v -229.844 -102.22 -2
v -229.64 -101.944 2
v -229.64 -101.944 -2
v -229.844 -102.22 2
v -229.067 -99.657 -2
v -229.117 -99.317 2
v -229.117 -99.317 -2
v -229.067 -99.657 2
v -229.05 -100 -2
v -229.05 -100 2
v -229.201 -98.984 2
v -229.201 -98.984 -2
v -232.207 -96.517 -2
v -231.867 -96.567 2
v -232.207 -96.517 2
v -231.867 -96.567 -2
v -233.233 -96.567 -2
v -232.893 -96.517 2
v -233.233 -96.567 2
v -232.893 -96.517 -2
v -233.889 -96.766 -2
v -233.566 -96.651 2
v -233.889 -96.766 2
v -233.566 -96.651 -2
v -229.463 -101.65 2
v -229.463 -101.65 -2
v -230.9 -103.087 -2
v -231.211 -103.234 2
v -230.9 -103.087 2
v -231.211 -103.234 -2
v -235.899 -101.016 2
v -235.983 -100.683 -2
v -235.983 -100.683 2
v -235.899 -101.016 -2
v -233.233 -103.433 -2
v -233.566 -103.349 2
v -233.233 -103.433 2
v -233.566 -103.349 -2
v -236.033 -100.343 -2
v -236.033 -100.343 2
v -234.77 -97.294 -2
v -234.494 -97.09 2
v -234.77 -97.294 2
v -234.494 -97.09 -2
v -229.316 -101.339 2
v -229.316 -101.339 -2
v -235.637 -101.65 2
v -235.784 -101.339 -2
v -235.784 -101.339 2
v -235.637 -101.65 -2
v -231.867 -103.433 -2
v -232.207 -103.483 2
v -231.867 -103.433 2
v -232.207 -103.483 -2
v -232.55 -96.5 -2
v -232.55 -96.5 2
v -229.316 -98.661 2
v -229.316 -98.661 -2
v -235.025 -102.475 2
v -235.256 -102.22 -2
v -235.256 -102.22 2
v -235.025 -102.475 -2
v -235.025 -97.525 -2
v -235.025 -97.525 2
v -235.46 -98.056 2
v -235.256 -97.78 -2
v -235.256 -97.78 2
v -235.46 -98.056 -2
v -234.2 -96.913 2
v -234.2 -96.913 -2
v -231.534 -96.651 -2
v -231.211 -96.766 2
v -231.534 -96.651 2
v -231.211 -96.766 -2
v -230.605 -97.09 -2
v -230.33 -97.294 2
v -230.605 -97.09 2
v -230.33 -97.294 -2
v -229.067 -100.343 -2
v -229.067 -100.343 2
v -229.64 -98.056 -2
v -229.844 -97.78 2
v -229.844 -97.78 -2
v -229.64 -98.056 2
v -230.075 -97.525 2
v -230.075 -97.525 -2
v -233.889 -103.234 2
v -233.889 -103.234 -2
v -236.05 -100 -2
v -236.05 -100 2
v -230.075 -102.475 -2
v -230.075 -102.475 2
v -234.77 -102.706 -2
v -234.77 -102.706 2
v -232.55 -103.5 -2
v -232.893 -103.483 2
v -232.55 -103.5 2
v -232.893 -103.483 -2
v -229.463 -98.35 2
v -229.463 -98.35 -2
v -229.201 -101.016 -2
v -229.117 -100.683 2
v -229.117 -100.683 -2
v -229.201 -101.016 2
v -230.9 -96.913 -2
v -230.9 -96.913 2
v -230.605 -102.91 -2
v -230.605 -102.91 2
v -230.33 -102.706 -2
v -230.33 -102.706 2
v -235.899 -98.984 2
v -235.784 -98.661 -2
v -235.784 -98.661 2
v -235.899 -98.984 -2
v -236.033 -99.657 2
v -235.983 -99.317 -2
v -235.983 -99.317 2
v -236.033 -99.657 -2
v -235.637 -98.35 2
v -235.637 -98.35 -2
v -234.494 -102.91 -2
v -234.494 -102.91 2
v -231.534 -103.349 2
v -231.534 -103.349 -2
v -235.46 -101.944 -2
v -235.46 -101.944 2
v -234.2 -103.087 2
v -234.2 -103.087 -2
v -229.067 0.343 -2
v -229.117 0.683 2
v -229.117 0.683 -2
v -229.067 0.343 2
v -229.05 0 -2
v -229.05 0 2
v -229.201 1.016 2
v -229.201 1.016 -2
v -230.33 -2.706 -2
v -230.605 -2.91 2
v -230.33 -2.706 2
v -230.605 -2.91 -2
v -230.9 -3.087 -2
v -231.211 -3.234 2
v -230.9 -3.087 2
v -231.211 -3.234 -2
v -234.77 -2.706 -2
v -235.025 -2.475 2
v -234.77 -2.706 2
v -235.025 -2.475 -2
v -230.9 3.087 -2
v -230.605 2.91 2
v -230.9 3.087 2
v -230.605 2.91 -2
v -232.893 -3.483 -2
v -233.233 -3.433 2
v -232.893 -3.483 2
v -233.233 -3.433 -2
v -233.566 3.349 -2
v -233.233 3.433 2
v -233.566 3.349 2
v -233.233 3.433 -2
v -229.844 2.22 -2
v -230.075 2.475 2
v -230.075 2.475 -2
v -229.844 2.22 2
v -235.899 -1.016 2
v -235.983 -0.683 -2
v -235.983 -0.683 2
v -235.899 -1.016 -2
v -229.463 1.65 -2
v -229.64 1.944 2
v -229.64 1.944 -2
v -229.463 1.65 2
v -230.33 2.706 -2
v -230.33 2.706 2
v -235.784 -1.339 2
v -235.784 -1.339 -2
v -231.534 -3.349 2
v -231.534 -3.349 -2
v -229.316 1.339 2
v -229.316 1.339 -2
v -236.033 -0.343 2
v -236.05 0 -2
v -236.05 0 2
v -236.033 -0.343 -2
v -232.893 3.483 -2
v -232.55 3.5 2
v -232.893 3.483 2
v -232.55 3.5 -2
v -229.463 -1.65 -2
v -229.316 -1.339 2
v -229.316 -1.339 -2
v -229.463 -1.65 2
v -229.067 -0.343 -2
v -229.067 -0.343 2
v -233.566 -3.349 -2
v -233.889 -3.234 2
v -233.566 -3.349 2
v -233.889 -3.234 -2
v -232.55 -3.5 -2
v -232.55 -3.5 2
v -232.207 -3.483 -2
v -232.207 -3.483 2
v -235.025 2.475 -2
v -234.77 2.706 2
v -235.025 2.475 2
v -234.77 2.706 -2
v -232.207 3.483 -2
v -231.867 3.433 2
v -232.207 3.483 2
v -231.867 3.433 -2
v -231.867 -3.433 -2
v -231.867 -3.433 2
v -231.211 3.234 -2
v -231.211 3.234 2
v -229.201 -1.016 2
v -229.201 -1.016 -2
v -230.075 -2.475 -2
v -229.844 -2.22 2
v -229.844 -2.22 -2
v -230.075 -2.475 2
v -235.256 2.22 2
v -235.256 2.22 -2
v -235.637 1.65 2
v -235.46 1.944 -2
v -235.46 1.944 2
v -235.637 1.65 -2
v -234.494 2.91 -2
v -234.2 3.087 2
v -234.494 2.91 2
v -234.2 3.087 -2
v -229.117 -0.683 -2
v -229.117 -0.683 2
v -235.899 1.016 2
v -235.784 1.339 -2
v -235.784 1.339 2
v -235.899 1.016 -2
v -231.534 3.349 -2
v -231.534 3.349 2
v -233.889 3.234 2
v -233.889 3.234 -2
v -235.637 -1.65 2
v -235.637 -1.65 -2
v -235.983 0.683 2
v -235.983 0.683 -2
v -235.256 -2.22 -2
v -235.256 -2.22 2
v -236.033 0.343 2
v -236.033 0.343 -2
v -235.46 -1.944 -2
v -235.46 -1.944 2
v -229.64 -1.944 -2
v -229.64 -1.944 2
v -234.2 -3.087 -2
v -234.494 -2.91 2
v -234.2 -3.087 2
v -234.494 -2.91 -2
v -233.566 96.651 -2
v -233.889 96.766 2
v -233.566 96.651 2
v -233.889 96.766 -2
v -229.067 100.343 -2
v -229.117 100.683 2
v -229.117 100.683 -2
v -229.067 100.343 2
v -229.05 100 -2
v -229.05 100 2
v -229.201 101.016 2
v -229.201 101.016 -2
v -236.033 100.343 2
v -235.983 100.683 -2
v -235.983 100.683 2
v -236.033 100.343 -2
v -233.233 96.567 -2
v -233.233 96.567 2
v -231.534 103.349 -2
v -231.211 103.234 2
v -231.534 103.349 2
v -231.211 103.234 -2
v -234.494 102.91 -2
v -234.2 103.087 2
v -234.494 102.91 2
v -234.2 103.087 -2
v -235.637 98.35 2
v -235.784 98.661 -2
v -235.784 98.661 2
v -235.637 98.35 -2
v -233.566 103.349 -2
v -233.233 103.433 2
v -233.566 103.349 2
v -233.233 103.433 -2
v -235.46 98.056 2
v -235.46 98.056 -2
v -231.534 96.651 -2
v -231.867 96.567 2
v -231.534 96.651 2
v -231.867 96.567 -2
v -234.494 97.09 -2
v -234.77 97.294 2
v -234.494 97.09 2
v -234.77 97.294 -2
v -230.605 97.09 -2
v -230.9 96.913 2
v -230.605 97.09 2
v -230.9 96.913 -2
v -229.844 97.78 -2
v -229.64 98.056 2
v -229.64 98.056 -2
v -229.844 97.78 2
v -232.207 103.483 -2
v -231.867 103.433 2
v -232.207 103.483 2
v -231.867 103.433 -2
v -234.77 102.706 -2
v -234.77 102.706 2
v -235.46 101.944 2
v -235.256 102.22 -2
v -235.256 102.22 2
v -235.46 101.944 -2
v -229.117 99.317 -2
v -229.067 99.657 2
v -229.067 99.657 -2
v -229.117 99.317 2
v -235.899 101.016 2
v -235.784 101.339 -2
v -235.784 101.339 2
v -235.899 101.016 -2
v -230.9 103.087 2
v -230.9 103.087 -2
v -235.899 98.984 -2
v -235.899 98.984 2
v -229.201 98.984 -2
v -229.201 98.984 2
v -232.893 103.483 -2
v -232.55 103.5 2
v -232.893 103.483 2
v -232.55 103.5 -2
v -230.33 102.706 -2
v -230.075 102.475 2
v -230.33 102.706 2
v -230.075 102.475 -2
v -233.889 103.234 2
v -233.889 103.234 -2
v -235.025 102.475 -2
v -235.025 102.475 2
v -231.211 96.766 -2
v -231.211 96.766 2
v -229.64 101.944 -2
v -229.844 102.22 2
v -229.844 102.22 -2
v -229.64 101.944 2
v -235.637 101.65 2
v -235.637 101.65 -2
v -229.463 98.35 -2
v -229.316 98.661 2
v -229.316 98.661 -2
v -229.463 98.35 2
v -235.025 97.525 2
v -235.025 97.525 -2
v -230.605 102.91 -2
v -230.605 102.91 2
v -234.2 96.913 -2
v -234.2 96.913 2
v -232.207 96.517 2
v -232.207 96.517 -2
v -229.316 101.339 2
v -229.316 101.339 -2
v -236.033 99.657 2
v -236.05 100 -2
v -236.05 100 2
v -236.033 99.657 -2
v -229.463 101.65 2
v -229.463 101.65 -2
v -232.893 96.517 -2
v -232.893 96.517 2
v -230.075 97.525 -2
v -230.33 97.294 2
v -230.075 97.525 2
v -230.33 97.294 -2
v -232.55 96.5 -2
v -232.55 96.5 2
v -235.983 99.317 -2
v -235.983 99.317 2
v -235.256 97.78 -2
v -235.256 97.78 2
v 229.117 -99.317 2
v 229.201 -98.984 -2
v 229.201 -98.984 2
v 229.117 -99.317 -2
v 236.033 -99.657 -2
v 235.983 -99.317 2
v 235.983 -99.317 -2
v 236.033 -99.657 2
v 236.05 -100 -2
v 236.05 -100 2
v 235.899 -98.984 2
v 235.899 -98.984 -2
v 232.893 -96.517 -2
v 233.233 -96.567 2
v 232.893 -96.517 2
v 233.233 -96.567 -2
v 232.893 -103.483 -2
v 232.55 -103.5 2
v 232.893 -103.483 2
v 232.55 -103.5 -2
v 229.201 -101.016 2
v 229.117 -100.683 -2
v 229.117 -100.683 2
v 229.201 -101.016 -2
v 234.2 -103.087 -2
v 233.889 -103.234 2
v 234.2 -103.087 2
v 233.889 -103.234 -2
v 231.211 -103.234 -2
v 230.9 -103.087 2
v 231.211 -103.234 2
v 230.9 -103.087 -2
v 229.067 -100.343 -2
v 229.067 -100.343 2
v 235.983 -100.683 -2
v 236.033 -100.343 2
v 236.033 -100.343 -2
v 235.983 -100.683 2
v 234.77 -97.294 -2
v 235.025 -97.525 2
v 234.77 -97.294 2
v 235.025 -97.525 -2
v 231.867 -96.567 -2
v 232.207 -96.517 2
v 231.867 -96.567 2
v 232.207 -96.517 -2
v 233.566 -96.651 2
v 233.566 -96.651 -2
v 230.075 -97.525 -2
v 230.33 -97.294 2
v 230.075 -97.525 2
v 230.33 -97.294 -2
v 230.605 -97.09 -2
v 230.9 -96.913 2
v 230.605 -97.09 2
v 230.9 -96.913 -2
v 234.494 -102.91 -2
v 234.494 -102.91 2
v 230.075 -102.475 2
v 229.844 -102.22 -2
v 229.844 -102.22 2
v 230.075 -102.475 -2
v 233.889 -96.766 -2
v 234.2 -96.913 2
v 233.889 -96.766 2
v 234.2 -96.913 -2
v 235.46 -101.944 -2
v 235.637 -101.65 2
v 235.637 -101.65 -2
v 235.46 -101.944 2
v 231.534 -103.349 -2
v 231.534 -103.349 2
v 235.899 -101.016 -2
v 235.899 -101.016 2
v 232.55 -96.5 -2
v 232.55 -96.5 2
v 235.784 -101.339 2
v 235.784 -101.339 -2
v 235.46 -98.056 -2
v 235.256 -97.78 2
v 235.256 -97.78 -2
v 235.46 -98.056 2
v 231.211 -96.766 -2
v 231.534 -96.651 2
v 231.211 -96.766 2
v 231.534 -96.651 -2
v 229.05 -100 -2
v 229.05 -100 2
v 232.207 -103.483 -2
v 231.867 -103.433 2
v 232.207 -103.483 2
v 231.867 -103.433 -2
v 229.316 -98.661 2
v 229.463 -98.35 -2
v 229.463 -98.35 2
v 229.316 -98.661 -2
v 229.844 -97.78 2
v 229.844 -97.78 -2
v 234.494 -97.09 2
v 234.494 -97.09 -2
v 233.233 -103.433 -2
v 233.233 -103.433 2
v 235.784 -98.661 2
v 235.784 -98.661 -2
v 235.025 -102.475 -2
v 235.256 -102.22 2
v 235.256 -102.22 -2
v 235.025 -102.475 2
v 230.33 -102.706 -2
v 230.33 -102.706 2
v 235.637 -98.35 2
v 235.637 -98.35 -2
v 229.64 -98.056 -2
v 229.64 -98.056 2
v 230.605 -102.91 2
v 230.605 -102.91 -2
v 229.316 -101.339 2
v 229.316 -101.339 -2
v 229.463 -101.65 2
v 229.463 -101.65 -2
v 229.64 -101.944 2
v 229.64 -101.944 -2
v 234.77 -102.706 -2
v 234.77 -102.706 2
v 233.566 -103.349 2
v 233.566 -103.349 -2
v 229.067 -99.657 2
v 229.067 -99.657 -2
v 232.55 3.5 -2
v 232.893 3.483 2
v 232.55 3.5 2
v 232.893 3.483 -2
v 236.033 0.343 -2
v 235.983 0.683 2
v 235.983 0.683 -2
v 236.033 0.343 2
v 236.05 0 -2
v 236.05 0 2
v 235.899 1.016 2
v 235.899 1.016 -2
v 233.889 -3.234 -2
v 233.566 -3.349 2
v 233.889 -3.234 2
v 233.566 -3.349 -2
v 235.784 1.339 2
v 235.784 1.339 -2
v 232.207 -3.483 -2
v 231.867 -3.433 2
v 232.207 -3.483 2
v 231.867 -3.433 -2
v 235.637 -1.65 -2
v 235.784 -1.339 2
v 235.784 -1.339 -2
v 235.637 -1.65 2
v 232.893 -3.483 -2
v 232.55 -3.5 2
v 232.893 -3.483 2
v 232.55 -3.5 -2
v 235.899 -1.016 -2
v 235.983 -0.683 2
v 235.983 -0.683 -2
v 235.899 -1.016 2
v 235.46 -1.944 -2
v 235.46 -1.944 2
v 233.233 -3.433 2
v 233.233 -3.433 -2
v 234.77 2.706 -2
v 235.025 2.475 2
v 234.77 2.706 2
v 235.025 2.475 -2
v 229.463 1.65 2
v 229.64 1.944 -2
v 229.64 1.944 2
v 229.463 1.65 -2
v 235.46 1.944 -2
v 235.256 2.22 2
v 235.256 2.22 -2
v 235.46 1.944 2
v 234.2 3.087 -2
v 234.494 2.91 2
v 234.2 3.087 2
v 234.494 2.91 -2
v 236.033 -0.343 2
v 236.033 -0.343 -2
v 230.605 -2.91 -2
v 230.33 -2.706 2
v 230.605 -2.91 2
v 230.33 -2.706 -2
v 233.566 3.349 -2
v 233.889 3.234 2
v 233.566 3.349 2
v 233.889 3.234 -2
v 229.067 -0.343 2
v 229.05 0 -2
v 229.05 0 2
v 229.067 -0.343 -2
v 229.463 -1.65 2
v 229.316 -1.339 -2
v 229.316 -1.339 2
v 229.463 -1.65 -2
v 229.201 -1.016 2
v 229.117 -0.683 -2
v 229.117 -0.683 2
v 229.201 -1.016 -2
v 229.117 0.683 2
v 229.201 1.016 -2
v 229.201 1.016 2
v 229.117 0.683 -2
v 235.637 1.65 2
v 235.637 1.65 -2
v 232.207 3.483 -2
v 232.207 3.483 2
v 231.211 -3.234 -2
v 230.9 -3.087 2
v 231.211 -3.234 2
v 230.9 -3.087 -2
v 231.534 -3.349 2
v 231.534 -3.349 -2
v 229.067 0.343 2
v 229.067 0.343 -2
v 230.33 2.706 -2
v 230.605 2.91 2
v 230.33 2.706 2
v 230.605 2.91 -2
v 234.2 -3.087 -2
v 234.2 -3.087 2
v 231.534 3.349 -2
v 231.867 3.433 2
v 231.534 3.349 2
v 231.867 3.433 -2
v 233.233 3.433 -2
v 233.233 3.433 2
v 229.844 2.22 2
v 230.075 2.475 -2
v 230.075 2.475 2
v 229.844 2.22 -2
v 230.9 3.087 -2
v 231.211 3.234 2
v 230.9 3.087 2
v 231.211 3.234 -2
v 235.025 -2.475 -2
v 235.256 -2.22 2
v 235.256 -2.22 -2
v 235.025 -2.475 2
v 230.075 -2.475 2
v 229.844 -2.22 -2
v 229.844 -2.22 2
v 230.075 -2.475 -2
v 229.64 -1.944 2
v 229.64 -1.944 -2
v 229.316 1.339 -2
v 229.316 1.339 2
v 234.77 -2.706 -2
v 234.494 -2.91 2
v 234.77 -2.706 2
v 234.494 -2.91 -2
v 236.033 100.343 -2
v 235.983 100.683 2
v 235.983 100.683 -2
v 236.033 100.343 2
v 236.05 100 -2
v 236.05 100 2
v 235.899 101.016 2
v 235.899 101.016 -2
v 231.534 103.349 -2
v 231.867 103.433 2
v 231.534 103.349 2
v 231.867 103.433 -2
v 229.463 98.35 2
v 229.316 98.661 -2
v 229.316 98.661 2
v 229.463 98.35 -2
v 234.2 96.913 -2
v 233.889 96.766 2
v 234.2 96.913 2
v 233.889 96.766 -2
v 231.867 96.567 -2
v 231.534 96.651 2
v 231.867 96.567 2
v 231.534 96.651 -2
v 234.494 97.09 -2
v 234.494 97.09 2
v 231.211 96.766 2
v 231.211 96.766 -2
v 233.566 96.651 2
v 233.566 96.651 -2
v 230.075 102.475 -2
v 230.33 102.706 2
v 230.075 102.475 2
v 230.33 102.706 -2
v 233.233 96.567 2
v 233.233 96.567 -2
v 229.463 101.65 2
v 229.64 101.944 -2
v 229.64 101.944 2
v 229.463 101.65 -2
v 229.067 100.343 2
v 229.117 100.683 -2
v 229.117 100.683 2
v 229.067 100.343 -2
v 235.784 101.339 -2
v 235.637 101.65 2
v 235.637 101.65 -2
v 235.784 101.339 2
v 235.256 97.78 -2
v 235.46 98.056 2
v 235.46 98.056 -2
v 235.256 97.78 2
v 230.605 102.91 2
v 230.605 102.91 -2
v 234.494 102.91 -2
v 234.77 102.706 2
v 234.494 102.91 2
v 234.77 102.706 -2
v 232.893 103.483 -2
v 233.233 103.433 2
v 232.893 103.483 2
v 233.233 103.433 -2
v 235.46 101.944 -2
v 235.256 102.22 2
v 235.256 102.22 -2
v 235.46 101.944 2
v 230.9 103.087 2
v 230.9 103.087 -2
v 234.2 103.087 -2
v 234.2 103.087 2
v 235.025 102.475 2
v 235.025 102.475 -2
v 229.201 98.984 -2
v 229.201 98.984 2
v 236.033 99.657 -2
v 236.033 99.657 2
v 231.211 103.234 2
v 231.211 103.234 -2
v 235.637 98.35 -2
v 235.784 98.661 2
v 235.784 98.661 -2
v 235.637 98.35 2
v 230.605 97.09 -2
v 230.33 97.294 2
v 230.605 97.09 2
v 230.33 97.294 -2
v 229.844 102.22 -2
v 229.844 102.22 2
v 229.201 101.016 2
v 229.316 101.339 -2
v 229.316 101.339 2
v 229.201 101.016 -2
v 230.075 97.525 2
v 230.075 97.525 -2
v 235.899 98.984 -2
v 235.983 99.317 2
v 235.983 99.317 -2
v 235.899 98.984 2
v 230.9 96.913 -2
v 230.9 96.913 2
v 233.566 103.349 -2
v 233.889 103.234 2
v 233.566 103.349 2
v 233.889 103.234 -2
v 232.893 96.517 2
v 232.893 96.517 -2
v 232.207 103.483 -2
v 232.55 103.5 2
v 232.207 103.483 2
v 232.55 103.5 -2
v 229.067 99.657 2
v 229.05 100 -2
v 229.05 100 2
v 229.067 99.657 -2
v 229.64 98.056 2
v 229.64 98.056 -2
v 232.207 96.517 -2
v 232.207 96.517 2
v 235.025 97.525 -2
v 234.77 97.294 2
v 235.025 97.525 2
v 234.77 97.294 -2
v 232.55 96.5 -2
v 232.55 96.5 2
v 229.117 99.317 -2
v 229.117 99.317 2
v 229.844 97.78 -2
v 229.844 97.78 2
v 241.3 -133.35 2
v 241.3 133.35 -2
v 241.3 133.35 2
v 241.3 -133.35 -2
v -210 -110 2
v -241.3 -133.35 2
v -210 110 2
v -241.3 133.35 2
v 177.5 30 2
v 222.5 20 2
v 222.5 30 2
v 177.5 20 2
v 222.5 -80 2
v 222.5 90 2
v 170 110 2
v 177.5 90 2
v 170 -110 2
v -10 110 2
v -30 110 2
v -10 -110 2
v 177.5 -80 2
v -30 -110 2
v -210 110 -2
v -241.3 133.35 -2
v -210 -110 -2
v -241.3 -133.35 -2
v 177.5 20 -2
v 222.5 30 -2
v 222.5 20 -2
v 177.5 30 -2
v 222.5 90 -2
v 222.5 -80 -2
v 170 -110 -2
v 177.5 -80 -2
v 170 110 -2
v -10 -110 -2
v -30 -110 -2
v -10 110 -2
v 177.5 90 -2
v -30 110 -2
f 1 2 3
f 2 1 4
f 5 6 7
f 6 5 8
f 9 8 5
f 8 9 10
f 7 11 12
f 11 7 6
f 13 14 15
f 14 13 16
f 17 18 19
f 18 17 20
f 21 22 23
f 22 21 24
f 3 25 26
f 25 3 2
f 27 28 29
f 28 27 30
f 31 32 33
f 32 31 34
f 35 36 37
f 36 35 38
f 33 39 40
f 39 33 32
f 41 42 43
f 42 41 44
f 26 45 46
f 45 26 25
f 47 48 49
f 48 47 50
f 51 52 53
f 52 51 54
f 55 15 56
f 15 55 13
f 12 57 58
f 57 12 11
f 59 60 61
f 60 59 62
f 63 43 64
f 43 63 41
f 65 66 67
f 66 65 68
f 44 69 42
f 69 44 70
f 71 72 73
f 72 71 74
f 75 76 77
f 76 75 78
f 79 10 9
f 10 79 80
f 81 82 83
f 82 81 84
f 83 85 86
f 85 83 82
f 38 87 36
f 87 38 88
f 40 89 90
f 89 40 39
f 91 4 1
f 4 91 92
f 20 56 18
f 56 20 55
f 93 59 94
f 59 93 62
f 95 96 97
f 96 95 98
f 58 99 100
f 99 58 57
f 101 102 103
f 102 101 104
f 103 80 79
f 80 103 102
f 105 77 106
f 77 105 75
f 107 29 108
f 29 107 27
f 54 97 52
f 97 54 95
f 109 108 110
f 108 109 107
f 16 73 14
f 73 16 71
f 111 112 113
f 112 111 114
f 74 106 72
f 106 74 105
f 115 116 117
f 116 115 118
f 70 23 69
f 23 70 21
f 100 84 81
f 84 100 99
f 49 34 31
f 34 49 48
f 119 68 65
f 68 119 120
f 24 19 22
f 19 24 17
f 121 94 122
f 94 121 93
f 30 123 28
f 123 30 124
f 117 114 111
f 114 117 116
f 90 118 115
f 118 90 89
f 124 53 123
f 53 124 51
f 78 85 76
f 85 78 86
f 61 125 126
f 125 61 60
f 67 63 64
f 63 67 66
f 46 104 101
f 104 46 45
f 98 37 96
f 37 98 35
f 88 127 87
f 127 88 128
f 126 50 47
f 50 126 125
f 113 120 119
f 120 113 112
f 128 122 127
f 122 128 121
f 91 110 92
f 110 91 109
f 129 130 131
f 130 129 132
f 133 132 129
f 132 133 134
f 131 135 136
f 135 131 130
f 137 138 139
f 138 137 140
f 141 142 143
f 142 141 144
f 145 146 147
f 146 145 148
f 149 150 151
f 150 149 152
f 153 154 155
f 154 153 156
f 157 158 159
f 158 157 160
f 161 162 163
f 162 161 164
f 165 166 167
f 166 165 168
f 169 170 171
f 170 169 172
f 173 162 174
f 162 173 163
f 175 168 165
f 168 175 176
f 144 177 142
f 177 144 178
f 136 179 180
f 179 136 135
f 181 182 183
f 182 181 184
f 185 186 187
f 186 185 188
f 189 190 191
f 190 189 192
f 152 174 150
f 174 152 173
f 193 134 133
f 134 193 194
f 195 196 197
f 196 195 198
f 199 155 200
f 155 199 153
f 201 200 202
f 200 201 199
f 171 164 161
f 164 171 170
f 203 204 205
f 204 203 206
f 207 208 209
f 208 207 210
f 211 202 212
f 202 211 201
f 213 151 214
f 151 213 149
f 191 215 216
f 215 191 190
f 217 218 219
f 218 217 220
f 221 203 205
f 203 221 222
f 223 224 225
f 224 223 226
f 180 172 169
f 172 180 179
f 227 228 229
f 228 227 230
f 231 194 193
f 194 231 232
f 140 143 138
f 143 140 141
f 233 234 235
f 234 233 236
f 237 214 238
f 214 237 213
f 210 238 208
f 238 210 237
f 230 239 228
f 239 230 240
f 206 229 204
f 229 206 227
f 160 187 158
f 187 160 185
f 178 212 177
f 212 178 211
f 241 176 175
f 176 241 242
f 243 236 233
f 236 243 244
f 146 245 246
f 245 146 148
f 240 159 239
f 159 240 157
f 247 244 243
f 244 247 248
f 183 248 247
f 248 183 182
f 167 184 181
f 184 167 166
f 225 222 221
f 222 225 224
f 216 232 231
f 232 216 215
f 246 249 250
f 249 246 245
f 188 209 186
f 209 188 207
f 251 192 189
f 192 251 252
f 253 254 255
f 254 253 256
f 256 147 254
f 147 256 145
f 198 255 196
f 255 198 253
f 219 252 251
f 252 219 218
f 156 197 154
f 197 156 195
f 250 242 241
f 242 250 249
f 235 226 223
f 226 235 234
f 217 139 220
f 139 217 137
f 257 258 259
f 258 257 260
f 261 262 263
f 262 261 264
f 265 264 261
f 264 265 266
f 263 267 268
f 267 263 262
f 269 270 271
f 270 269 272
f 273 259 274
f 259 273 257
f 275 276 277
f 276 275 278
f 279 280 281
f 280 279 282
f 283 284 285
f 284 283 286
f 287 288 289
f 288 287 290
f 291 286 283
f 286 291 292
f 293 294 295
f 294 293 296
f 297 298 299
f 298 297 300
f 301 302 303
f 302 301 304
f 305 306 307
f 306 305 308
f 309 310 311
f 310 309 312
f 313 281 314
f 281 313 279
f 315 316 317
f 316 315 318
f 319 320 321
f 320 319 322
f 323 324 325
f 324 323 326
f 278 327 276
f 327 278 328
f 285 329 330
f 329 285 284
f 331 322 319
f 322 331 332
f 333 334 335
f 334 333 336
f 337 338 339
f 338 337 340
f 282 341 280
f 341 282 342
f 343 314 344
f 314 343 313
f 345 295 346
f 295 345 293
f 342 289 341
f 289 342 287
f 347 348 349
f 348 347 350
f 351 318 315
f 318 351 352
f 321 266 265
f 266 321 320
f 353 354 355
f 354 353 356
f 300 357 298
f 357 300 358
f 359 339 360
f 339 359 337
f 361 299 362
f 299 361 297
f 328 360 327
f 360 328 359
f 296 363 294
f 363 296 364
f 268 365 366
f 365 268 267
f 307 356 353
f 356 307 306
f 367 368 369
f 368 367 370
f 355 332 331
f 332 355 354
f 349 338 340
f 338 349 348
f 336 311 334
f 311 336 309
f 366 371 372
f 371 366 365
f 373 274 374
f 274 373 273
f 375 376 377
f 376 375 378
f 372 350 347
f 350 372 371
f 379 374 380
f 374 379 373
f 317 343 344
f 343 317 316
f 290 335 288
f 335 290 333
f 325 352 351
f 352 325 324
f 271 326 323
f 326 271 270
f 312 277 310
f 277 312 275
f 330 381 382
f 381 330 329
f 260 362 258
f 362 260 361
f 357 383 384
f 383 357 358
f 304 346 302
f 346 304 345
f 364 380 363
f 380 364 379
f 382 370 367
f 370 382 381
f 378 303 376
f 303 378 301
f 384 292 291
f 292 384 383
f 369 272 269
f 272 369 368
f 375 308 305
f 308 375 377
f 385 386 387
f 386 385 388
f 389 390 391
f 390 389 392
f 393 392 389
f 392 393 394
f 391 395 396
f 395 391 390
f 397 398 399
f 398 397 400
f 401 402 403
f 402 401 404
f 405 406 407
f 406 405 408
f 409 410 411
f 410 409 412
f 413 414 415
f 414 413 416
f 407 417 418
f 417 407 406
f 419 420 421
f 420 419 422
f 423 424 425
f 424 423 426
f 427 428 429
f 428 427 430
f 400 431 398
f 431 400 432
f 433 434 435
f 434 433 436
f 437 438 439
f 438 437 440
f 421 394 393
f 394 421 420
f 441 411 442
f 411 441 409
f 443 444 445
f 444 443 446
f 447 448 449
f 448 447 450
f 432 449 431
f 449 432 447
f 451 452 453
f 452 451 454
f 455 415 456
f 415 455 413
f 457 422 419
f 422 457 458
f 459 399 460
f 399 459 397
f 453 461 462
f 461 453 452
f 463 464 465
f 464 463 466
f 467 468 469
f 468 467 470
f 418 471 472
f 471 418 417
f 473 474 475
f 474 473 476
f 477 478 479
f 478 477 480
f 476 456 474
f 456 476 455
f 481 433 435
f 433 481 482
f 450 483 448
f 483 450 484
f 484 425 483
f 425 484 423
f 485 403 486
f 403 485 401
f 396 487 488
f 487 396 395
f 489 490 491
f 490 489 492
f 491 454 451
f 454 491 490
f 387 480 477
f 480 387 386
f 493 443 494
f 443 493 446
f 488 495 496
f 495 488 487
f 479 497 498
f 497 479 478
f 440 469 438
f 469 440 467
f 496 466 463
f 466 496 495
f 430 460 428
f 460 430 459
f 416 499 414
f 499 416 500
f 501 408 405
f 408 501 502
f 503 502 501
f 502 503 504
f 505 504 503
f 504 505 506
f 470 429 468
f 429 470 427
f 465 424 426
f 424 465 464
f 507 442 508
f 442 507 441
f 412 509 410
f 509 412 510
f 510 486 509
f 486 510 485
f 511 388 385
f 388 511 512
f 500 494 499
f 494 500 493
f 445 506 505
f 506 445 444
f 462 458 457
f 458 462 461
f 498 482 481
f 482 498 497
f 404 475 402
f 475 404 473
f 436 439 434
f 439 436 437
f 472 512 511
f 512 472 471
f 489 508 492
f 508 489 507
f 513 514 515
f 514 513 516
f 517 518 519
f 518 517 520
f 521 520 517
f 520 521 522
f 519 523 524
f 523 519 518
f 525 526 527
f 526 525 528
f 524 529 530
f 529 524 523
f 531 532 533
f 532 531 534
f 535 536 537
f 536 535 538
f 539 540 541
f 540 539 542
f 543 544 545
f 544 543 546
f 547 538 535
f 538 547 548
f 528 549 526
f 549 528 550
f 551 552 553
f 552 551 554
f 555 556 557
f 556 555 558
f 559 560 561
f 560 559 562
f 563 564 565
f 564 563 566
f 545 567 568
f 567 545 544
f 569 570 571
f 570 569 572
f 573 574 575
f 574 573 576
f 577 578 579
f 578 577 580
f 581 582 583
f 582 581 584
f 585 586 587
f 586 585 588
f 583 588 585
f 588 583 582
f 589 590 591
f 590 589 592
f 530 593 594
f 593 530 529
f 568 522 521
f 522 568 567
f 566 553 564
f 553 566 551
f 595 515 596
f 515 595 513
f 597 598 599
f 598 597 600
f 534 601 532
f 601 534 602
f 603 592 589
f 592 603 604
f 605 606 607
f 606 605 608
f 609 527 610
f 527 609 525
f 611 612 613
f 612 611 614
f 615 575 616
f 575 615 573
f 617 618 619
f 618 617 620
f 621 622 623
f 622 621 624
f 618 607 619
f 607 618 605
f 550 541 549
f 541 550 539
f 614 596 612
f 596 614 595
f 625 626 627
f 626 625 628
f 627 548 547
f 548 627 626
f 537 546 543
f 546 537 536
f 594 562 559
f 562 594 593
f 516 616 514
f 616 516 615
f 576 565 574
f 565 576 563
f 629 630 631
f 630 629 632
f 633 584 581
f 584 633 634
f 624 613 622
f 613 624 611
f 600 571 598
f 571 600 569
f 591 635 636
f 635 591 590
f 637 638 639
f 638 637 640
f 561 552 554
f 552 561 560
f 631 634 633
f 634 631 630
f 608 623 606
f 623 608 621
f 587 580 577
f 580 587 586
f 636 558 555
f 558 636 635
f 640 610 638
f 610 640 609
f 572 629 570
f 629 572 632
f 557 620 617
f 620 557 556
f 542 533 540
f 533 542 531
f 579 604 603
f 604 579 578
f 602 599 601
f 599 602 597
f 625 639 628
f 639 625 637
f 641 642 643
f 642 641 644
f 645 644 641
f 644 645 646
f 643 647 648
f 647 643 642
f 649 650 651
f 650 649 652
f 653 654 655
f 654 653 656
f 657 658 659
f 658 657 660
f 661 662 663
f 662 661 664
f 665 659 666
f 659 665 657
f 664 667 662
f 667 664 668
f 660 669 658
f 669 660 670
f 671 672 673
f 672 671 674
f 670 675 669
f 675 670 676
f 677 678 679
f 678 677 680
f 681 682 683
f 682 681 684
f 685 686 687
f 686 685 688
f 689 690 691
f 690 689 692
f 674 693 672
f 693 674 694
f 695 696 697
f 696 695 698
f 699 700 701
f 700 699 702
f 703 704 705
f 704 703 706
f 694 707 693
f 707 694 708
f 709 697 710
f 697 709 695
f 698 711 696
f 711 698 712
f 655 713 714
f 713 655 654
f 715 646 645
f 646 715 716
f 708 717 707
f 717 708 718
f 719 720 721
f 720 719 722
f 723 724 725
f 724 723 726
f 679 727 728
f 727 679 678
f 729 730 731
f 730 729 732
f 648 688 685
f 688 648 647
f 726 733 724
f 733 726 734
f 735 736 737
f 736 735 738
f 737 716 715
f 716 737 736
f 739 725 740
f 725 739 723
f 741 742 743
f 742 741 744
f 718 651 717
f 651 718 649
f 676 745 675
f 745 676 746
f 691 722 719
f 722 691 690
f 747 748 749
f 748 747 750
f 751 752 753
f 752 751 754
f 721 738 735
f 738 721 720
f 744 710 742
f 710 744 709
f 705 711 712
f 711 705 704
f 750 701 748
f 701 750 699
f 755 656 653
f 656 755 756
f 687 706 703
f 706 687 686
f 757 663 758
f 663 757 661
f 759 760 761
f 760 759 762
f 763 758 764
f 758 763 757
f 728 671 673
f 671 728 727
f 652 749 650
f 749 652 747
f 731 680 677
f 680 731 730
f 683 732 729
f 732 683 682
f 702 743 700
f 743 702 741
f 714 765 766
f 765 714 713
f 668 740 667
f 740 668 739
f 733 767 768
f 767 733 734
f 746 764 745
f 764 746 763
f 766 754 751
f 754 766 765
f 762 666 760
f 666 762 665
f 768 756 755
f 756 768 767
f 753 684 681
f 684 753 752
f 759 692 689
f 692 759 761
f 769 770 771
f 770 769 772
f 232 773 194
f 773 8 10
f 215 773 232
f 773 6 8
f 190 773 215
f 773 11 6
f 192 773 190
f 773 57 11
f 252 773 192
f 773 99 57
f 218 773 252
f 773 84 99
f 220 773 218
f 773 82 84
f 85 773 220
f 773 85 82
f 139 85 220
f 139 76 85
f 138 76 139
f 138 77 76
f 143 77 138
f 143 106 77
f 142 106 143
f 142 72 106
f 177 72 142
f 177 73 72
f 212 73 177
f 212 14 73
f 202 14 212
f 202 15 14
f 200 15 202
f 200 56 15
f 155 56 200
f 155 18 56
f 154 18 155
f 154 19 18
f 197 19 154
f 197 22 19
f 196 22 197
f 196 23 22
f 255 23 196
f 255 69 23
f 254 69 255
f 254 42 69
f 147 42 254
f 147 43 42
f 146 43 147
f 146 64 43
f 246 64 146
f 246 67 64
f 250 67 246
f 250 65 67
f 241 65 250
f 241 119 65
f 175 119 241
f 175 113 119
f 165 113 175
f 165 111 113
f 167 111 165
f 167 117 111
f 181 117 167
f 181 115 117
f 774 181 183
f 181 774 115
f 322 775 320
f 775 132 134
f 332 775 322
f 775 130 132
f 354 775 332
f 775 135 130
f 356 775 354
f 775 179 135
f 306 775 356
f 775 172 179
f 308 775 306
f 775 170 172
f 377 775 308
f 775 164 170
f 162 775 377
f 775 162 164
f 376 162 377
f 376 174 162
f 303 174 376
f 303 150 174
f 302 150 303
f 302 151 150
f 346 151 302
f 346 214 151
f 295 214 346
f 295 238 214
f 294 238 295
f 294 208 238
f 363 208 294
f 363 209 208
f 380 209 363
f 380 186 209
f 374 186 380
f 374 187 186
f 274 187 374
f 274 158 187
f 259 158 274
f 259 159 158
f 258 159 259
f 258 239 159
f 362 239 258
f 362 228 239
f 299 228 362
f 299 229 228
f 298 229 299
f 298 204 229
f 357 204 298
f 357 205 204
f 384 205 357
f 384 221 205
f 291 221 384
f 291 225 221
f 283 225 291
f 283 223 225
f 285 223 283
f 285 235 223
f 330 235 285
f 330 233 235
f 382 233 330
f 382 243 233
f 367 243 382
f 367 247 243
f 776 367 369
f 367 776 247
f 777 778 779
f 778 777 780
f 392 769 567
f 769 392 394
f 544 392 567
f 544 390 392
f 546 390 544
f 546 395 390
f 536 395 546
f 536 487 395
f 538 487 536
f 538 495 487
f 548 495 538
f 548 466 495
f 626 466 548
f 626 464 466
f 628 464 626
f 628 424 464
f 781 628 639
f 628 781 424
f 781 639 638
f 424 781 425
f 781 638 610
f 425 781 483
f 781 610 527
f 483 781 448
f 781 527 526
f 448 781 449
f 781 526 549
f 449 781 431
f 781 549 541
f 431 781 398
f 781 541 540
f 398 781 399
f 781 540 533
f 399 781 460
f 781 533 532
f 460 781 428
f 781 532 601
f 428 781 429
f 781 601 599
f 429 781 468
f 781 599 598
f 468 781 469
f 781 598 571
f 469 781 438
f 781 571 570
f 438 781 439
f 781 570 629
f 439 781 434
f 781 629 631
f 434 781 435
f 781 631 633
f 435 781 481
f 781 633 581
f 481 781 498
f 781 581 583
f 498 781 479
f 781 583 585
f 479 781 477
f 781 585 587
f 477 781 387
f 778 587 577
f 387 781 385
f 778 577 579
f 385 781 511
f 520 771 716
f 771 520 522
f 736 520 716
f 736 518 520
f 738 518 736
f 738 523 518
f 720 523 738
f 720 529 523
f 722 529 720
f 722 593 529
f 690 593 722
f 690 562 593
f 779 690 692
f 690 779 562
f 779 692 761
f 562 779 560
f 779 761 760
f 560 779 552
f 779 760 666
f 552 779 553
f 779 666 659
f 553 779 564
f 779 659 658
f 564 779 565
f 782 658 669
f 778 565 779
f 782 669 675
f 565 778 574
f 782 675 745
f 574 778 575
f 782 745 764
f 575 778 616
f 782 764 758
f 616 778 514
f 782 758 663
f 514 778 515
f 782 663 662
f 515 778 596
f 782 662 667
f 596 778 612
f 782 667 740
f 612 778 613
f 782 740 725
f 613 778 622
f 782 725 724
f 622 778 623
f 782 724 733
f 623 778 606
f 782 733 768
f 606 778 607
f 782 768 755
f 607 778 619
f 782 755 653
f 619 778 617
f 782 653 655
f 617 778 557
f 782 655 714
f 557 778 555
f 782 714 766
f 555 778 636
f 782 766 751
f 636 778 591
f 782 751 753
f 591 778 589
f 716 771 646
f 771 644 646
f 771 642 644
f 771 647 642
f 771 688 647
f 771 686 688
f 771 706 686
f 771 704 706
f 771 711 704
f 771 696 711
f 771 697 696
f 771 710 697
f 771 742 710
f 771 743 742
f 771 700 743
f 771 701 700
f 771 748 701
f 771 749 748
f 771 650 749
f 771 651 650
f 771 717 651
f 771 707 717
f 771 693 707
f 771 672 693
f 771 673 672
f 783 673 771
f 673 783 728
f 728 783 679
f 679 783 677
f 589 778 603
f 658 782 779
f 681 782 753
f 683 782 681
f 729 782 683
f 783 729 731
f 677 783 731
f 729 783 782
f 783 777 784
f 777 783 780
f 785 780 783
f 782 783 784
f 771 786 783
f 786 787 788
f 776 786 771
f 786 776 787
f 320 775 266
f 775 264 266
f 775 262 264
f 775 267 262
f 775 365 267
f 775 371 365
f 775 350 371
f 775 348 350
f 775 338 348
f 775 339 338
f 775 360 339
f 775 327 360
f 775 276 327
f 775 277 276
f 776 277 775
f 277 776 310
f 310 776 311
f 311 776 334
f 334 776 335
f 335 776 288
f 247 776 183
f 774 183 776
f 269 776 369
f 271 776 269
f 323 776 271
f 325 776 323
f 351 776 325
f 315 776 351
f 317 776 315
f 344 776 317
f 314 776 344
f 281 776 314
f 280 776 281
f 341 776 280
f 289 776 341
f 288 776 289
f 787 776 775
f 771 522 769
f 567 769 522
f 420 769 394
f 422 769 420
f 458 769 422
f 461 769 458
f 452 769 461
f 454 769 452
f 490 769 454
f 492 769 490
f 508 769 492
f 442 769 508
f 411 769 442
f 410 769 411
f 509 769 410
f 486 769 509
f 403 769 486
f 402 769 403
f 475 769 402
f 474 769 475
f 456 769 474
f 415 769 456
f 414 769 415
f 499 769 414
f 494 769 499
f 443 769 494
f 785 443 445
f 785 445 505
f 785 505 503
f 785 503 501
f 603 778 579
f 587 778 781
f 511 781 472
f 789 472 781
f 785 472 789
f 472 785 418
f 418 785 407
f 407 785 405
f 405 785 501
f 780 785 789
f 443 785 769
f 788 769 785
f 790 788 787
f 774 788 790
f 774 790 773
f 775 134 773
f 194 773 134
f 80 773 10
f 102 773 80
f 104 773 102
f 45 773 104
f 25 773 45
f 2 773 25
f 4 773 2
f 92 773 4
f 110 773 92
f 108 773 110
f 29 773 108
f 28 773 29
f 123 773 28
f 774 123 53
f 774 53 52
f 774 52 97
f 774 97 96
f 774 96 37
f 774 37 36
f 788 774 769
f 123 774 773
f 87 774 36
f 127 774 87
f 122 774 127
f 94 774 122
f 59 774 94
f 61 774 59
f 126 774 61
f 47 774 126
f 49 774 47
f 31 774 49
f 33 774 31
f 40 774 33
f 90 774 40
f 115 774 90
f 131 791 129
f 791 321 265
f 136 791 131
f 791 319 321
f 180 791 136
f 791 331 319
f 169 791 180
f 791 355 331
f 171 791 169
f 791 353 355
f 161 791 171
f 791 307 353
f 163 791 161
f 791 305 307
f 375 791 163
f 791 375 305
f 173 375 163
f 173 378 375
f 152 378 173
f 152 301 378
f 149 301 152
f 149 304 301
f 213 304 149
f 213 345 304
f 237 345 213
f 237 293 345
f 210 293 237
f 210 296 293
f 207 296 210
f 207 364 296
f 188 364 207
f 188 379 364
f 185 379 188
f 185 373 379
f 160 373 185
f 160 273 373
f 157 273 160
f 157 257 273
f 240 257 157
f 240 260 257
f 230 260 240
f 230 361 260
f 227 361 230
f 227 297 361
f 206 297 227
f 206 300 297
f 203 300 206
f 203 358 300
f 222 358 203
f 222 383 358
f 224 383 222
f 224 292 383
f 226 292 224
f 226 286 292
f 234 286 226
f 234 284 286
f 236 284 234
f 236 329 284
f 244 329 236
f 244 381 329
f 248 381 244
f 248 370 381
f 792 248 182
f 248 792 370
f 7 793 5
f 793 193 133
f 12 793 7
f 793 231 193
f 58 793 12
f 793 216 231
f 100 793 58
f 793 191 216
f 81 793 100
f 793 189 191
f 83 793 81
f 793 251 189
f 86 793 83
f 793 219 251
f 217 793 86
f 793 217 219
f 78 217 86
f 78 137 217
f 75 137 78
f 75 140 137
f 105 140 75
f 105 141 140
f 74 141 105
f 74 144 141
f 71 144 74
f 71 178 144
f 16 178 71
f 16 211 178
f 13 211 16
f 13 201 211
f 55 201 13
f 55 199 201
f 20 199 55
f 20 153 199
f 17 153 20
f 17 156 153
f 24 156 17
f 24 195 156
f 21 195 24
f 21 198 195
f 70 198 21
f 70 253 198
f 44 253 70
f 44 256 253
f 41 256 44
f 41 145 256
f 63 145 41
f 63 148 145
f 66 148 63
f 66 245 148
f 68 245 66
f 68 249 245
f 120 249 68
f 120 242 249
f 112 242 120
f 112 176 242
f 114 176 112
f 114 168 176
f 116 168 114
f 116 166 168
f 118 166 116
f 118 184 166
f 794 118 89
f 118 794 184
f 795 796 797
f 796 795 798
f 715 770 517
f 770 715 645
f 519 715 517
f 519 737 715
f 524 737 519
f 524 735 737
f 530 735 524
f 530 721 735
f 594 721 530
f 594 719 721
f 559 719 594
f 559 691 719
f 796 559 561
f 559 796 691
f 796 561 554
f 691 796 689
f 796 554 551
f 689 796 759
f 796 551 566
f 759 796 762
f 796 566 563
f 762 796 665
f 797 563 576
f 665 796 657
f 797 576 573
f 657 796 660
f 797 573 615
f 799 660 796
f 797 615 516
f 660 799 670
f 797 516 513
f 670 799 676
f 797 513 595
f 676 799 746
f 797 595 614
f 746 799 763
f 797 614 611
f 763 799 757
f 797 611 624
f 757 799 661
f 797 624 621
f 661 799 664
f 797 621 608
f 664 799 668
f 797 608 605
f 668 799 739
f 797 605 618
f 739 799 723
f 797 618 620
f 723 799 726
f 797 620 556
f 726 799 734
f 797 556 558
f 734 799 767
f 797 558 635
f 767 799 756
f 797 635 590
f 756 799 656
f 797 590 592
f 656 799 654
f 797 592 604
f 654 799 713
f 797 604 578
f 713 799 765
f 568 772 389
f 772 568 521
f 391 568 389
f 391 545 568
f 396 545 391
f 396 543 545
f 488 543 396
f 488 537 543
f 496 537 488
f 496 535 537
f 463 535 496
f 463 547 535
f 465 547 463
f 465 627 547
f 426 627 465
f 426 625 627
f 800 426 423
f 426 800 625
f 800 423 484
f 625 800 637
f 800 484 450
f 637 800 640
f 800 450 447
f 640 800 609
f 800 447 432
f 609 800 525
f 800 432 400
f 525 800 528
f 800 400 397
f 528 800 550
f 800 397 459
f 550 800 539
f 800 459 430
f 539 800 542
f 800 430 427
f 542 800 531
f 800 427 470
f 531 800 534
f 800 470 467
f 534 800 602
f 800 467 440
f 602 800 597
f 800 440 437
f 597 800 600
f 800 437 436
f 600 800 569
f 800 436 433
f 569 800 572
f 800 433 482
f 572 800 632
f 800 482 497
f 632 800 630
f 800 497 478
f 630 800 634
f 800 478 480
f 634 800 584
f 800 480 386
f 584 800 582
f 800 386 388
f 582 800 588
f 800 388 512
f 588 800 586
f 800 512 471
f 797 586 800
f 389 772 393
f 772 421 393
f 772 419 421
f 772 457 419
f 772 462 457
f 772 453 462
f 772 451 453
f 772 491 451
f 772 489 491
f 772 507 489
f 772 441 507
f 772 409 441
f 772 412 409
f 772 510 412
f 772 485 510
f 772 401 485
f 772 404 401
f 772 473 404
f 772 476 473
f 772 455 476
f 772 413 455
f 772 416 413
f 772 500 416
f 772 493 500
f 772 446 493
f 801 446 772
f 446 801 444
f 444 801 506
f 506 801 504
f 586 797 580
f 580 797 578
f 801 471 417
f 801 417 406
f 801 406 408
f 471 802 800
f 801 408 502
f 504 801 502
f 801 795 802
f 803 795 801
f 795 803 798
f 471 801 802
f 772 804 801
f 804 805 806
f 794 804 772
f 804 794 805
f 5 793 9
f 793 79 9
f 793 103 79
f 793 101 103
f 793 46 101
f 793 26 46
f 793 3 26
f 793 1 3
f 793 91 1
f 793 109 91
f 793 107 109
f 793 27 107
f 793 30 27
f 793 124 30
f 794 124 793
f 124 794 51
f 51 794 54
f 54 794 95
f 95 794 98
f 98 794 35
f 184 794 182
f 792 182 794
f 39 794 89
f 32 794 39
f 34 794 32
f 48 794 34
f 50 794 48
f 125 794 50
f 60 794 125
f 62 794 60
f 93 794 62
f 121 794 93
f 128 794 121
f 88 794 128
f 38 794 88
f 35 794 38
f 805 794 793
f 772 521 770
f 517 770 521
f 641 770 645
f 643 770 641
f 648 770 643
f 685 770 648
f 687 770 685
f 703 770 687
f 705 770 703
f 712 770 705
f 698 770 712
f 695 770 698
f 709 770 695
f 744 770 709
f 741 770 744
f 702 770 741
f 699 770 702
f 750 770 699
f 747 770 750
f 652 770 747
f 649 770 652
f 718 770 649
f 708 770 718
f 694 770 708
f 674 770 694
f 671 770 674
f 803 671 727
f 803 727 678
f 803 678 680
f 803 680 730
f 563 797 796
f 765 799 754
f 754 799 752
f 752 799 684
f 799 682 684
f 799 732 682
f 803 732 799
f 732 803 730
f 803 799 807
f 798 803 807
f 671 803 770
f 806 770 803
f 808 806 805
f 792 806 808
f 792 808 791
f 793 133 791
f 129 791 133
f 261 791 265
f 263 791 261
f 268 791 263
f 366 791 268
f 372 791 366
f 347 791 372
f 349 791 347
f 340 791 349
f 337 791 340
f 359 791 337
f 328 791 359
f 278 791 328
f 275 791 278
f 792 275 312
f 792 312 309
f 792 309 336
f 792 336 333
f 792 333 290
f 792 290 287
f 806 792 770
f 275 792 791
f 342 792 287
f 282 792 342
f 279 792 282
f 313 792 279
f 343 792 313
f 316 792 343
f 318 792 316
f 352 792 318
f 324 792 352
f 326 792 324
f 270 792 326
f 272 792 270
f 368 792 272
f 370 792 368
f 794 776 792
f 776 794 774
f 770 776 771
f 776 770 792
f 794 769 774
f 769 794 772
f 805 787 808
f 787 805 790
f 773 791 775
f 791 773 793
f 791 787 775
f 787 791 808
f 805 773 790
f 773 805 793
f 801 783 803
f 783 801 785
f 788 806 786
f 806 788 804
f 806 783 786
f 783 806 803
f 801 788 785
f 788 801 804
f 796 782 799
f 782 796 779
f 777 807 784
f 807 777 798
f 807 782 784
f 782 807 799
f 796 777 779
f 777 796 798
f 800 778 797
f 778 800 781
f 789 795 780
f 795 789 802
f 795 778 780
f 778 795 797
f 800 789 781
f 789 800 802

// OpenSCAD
/*
 * REVOLUTIONARY TECHNOLOGY: 6U RACKMOUNT AVIONICS DASHBOARD
 * Standard: EIA-310 19-Inch Rack (Width: 482.6mm, 6U Height: 266.7mm)
 * Cutouts: PFD (Primary Flight Display), ND (Nav Display), ISFD (Standby)
 */

$fn = 64;

// 19" Rack Standard Dimensions
rack_width = 482.6;
rack_height = 266.7; // 6U
panel_thick = 4.0;
hole_spacing_x = 465.1; // Standard mounting hole width

module rackmount_avionics_panel() {
    color("Silver") {
        difference() {
            // Main Aluminum Panel
            cube([rack_width, rack_height, panel_thick], center=true);
            
            // Rackmount Ears (Mounting Holes)
            for (x = [-hole_spacing_x/2, hole_spacing_x/2]) {
                for (y = [-100, 0, 100]) { // 3 bolts per side for 6U
                    translate([x, y, 0])
                        cylinder(r=3.5, h=panel_thick + 2, center=true);
                }
            }
            
            // --- AVIONICS SCREEN CUTOUTS ---
            
            // 1. Primary Flight Display (PFD) - Left
            translate([-120, 0, 0])
                cube([180, 220, panel_thick + 2], center=true);
                
            // 2. Navigation Display (ND) - Center
            translate([80, 0, 0])
                cube([180, 220, panel_thick + 2], center=true);
                
            // 3. Integrated Standby Flight Display (ISFD) - Top Right
            translate([200, 60, 0])
                cube([45, 60, panel_thick + 2], center=true);
                
            // 4. EICAS / System Annunciators - Bottom Right
            translate([200, -30, 0])
                cube([45, 100, panel_thick + 2], center=true);
        }
    }
}

rackmount_avionics_panel();
